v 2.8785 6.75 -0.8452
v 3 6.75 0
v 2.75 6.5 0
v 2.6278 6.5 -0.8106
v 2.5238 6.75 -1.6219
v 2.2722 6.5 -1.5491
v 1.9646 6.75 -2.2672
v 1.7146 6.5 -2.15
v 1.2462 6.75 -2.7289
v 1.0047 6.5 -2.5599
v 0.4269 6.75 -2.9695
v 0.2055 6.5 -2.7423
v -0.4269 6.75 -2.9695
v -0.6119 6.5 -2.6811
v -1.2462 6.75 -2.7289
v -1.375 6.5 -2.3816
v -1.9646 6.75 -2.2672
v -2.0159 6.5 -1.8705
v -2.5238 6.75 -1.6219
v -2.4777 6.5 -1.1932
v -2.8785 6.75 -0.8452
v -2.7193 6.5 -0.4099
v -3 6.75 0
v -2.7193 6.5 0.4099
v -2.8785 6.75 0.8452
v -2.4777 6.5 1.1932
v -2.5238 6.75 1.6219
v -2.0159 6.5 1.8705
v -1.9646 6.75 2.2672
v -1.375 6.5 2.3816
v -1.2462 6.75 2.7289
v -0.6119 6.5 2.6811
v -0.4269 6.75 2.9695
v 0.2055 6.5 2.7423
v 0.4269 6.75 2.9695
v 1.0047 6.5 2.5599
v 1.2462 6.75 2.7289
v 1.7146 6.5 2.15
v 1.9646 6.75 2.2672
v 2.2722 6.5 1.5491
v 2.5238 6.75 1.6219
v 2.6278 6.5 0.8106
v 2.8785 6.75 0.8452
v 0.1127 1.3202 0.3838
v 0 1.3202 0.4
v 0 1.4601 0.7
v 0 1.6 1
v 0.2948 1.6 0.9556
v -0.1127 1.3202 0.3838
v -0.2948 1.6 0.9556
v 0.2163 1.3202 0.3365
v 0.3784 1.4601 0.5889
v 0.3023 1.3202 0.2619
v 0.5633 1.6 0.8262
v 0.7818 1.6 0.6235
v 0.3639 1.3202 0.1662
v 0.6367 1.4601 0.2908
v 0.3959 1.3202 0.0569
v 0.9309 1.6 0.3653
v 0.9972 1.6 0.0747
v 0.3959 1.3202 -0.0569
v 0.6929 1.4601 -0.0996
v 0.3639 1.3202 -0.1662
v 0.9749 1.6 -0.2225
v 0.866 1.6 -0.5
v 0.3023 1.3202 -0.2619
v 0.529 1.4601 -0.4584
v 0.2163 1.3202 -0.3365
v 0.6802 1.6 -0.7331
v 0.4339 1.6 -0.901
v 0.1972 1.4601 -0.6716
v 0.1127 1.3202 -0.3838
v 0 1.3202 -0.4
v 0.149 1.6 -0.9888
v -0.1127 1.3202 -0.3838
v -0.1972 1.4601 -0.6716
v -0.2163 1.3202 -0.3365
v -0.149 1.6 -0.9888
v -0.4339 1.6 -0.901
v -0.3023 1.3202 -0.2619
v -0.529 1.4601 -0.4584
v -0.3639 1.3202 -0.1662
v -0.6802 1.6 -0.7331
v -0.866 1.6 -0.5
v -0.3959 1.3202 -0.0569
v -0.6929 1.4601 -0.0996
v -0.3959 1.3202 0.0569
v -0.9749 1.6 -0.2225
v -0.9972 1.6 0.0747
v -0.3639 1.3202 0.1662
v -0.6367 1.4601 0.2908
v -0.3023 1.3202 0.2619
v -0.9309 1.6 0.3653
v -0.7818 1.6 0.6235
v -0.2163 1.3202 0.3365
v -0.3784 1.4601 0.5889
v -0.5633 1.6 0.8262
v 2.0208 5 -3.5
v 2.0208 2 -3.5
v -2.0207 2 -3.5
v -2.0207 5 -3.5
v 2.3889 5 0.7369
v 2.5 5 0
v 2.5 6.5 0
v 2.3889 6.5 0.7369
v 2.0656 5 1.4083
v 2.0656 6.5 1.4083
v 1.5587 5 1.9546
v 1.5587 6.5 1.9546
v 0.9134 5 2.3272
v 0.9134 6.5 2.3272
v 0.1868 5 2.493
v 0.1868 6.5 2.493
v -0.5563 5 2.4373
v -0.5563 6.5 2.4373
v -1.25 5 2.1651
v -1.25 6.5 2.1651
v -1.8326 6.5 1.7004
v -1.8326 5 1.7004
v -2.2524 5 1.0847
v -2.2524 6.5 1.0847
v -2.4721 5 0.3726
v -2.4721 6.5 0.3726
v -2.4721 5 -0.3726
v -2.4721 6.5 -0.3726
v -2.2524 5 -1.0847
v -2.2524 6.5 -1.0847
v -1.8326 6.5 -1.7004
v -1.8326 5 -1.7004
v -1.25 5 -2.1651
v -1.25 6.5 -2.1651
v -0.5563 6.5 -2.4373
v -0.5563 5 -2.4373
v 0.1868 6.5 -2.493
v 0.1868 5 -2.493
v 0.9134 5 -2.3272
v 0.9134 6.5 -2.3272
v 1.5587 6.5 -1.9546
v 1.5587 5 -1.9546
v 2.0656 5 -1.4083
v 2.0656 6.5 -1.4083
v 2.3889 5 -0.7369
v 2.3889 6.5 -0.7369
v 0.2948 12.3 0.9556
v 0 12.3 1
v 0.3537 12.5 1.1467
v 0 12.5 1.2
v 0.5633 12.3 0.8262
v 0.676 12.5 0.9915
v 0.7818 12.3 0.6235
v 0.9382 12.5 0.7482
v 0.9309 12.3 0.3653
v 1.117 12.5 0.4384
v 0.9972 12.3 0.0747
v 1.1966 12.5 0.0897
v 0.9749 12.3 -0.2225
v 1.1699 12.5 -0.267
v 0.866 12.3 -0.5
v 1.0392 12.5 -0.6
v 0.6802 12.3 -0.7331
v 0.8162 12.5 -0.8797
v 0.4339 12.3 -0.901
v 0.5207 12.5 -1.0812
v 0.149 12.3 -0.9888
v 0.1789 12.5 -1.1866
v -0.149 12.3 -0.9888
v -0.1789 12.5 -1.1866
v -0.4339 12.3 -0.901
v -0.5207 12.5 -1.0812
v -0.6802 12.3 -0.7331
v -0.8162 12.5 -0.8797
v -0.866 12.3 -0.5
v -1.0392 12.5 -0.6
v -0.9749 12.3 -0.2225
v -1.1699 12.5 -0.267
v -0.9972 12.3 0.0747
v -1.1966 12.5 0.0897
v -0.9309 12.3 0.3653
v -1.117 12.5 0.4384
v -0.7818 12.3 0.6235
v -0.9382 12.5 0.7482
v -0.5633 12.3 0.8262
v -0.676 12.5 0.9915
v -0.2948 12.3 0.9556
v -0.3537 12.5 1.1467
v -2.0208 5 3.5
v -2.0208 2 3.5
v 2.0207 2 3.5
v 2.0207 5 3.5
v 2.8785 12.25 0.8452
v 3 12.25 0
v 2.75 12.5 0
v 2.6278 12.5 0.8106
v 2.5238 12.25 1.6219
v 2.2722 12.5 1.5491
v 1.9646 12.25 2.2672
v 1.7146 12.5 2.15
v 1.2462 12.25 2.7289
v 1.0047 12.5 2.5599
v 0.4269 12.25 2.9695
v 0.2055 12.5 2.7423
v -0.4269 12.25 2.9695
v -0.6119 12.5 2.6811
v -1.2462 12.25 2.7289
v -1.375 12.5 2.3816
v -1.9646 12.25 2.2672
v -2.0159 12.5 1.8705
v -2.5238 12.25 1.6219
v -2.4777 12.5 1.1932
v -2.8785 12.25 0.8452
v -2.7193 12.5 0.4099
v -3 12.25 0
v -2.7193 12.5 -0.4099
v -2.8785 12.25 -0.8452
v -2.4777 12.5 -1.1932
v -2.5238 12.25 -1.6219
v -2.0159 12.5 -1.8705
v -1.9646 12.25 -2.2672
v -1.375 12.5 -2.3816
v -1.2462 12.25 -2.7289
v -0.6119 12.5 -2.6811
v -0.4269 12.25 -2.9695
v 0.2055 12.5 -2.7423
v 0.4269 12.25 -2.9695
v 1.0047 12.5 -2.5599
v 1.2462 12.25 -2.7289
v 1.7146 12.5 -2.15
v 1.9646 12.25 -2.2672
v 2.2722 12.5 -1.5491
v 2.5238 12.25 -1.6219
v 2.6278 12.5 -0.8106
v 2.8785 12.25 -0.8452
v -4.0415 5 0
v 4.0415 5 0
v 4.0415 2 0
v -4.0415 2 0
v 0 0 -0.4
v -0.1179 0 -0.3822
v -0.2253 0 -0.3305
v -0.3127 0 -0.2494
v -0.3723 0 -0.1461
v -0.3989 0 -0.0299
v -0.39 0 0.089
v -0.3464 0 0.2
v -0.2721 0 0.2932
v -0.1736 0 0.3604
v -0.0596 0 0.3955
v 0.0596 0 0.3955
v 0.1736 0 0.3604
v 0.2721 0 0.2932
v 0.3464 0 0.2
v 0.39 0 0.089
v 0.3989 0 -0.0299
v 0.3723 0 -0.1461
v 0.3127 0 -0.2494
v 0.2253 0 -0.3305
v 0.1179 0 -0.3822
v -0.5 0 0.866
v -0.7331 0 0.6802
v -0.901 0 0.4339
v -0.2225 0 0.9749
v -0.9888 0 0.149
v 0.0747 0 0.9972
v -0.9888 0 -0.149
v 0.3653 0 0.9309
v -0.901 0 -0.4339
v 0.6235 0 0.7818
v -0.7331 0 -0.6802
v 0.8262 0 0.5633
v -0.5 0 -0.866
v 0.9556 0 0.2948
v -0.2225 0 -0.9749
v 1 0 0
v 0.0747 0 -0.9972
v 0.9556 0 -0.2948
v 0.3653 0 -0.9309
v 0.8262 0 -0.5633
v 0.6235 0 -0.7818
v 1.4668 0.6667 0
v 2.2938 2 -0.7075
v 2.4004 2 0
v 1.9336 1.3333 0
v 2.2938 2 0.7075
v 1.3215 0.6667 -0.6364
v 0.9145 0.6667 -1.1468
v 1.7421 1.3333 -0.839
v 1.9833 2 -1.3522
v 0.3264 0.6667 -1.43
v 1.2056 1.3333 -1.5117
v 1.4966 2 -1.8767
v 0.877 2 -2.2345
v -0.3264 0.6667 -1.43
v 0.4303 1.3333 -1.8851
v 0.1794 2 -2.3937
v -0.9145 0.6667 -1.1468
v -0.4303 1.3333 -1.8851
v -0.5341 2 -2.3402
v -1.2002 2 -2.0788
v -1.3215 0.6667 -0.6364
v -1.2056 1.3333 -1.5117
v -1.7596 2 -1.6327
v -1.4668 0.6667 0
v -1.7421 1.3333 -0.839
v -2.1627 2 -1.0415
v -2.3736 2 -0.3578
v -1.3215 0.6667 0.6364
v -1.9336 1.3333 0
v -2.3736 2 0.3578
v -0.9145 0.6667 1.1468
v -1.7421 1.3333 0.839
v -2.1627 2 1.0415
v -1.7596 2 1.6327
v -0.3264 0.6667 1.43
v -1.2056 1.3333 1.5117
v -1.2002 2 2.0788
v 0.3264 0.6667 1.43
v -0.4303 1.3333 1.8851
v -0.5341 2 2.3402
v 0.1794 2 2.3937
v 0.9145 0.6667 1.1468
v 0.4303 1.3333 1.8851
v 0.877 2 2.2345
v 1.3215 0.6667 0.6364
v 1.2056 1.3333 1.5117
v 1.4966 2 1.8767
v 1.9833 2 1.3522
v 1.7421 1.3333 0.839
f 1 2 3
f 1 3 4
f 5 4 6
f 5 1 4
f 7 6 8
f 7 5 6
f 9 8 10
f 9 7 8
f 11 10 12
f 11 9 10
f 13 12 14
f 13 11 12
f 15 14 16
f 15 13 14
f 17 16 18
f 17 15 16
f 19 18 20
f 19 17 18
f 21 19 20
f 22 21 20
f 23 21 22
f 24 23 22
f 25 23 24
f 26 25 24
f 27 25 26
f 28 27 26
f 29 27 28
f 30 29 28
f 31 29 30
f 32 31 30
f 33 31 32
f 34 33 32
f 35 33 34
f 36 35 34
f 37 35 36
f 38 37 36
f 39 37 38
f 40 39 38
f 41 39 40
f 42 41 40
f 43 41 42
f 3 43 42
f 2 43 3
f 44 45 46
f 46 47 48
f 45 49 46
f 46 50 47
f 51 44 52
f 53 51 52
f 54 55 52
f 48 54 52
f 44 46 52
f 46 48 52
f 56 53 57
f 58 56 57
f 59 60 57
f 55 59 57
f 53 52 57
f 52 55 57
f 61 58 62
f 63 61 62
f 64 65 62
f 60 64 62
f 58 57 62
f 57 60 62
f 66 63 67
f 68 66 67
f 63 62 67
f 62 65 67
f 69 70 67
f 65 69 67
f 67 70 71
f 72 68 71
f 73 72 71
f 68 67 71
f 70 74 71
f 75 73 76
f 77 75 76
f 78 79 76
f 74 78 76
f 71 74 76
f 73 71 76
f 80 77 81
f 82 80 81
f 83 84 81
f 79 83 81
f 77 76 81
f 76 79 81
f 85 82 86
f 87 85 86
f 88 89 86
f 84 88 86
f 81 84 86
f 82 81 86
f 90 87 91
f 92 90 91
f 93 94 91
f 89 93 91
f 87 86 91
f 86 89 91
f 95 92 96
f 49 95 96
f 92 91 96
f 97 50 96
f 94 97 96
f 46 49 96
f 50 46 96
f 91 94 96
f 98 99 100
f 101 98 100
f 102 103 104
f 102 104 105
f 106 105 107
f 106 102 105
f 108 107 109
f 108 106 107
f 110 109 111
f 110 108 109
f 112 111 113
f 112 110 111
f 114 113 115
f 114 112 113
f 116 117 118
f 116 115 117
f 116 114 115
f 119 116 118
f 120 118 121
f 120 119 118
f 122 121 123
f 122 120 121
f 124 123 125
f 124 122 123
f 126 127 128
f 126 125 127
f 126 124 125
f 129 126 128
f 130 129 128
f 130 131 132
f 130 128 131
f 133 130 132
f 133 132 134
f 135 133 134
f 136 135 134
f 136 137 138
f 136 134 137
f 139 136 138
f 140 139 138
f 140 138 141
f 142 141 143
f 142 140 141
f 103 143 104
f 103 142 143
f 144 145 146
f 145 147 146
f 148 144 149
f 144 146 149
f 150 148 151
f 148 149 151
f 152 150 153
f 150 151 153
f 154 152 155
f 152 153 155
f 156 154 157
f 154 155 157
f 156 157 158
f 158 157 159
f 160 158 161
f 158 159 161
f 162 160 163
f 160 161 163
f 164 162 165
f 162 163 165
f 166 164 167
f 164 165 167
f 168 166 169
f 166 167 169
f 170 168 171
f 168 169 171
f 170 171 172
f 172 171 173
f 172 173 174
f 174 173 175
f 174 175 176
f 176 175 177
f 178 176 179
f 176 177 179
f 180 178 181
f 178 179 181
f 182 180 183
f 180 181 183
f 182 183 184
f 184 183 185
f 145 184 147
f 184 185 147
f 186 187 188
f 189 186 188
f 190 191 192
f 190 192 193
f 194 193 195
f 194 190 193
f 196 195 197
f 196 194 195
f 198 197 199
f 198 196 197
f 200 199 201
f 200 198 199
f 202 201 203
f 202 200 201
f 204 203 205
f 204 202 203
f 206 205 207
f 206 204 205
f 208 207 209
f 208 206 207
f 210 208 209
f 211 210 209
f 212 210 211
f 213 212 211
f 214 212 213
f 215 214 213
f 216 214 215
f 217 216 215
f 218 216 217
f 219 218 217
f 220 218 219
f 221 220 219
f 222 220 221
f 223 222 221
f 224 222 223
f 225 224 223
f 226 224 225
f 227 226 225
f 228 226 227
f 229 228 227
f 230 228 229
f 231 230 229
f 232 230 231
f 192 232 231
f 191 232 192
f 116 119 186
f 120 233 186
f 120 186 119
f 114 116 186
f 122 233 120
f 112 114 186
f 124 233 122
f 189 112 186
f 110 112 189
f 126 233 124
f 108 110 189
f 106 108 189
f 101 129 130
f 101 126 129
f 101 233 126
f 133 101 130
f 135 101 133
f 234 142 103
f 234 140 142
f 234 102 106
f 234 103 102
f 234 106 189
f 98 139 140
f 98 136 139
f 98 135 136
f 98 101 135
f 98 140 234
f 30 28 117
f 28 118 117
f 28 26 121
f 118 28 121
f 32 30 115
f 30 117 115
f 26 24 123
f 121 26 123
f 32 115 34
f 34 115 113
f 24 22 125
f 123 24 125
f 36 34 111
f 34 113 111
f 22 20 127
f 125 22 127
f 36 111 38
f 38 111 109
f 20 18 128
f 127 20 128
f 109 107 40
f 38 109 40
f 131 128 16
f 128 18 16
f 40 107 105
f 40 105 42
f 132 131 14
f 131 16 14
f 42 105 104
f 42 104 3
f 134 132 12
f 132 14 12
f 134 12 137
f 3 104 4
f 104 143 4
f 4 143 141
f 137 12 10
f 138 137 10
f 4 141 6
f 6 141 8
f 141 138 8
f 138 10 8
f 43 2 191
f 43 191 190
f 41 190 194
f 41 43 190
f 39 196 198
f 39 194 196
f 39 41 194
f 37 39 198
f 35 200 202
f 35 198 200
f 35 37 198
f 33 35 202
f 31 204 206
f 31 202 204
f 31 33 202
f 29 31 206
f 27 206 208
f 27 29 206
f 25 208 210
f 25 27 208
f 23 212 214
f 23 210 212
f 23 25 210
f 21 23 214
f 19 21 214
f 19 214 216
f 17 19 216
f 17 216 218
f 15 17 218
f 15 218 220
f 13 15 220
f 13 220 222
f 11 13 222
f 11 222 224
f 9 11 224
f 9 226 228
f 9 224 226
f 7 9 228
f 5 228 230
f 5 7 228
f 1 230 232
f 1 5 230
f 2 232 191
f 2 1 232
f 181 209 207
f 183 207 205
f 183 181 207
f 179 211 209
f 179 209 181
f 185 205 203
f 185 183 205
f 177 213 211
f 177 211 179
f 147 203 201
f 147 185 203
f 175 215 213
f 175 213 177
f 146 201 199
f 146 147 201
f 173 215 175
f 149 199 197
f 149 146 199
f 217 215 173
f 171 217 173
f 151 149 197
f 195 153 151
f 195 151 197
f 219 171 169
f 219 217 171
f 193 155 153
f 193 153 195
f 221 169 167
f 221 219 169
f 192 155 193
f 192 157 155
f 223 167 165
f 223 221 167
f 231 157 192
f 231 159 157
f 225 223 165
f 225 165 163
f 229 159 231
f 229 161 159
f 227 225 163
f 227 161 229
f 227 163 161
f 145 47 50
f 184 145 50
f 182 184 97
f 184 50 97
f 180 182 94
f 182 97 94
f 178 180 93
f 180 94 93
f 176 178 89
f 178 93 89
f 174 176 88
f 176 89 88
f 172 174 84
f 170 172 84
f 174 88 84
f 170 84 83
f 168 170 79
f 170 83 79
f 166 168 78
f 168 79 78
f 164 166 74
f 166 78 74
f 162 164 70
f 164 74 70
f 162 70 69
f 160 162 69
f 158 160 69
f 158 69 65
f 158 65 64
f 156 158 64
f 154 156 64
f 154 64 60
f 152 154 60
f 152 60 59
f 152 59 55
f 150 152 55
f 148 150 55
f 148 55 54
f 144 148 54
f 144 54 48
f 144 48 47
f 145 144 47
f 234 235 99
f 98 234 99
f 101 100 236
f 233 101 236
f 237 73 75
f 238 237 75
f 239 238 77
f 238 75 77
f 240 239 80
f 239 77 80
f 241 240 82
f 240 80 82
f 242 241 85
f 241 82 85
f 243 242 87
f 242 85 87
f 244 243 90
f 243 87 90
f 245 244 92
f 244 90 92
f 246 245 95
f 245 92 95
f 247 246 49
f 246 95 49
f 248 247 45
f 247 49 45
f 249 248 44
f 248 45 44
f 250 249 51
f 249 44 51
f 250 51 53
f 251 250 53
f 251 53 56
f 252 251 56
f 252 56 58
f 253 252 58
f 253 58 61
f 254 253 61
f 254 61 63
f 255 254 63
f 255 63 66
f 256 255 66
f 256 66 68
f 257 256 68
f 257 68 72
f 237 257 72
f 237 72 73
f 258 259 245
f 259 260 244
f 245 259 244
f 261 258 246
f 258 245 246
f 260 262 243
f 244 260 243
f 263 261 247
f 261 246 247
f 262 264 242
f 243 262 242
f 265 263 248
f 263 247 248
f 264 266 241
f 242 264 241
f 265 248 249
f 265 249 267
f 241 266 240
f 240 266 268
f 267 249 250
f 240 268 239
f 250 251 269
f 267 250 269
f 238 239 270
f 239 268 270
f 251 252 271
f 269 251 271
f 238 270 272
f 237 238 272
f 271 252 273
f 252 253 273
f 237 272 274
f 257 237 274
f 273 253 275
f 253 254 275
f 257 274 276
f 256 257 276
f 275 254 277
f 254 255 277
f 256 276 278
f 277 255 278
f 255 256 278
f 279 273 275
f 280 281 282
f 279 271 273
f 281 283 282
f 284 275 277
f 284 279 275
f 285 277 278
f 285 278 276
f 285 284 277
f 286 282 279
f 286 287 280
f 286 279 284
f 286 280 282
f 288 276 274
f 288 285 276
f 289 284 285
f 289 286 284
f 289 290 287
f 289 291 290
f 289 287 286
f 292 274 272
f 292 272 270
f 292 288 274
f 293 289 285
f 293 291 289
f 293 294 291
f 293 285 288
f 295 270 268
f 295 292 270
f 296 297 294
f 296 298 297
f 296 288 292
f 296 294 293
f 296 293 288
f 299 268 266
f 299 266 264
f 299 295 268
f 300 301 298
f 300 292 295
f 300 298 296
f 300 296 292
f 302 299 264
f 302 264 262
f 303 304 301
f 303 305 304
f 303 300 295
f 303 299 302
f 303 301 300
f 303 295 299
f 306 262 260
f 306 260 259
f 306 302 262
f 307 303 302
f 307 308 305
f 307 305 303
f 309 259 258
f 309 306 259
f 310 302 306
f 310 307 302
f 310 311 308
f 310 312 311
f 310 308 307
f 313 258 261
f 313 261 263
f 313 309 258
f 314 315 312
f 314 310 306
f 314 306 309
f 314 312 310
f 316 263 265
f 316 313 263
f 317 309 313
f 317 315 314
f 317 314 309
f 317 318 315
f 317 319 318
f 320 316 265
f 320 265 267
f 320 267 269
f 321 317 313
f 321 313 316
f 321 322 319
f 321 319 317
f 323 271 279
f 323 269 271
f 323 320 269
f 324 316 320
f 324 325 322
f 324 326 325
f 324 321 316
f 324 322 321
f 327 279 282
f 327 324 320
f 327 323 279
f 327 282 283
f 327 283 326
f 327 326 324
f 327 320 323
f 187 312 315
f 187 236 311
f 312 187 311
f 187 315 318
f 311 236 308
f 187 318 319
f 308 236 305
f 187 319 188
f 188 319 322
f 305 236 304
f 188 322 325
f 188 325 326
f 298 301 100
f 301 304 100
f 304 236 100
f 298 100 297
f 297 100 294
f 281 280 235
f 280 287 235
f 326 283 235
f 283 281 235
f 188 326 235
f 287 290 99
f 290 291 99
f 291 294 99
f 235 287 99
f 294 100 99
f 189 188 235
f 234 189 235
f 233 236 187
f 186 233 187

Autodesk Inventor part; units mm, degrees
ref_plane "YZ Plane" through (0, 0, 0) normal (1, 0, 0) x (0, 1, 0)
ref_plane "XZ Plane" through (0, 0, 0) normal (0, 1, 0) x (-1, 0, 0)
ref_plane "XY Plane" through (0, 0, 0) normal (0, 0, 1) x (1, 0, 0)
sketch "Эскиз1" plane through (0, 0, 0) normal (0, 0, 1) x (1, 0, 0)
  line L0 (0, 0) -> (0, 15)
  line L1 (0, 12.5) -> (3, 12.5)
  line L2 (2.4004, 2) -> (4.0415, 2)
  line L3 (2.5, 5) -> (4.0415, 5)
  line L4 (2.5, 6.5) -> (3, 6.5)
  line L5 (0, 0) -> (1, 0)
  line L6 (2.5, 6.5) -> (2.5, 5)
  line L7 (3, 12.5) -> (3, 6.5)
  line L8 (1, 0) -> (2.4004, 2)
  line L9 (4.0415, 5) -> (4.0415, 2)
  line L10 (0, 12.5) -> (0, 0)
  dimension "d0" = 15
  dimension "d1" = 12.5
  dimension "d2" = 10.5
  dimension "d3" = 7.5
  dimension "d4" = 6
  dimension "d6" = 5
  dimension "d7" = 6
  dimension "d8" = 125
  dimension "d11" = 8.083
  dimension "d44" = 2
revolve "Вращение1" add sketch "Эскиз1" angle 360 about axis through (0, 0, 0) along (0, 1, 0)
chamfer "Фаска1" distance 0.25 angle 45 2 edges at (-3, 12.5, 0) (-3, 6.5, 0)
thread "Резьба1" size "M6x1" class "6g" standard "ANSI Metric M Profile" full length
sketch "Эскиз2" plane through (0, 12.5, 0) normal (0, 1, 0) x (1, 0, 0)
  point P0 (0, 0)
  point P1 (0, 0)
sketch "Эскиз3" plane through (0, 0, 0) normal (0, -1, 0) x (1, 0, 0)
  point P0 (0, 0)
  point P1 (0, 0)
hole "Отверстие2" at (0, 12.5, 0) direction (0, -1, 0) diameter 2 depth 10.9 tip angle 130
chamfer "Фаска2" distance 0.2 angle 45 1 edges at (0, 12.5, -1)
hole "Отверстие3" at (0, 0, 0) direction (0, 1, 0) diameter 0.8 depth 1.6
sketch "Эскиз4" plane through (0, 2, 0) normal (0, -1, 0) x (1, 0, 0)
  circle A0 centre (0, 0) radius 0.4 projected
  circle A1 centre (0, 0) radius 4.0415 projected
  line L0 (4.0415, 0) -> (2.0208, -3.5)
  line L1 (2.0208, -3.5) -> (-2.0207, -3.5)
  line L2 (-2.0207, -3.5) -> (-4.0415, 0)
  line L3 (-4.0415, 0) -> (-2.0208, 3.5)
  line L4 (-2.0208, 3.5) -> (2.0207, 3.5)
  line L5 (2.0207, 3.5) -> (4.0415, 0)
extrude "Выдавливание1" cut sketch "Эскиз4" against normal blind 3 contours L5 A1 | A1 L0 | L4 A1 | A1 L1 | L3 A1 | A1 L2
properties part number "nozzle-0,8"
